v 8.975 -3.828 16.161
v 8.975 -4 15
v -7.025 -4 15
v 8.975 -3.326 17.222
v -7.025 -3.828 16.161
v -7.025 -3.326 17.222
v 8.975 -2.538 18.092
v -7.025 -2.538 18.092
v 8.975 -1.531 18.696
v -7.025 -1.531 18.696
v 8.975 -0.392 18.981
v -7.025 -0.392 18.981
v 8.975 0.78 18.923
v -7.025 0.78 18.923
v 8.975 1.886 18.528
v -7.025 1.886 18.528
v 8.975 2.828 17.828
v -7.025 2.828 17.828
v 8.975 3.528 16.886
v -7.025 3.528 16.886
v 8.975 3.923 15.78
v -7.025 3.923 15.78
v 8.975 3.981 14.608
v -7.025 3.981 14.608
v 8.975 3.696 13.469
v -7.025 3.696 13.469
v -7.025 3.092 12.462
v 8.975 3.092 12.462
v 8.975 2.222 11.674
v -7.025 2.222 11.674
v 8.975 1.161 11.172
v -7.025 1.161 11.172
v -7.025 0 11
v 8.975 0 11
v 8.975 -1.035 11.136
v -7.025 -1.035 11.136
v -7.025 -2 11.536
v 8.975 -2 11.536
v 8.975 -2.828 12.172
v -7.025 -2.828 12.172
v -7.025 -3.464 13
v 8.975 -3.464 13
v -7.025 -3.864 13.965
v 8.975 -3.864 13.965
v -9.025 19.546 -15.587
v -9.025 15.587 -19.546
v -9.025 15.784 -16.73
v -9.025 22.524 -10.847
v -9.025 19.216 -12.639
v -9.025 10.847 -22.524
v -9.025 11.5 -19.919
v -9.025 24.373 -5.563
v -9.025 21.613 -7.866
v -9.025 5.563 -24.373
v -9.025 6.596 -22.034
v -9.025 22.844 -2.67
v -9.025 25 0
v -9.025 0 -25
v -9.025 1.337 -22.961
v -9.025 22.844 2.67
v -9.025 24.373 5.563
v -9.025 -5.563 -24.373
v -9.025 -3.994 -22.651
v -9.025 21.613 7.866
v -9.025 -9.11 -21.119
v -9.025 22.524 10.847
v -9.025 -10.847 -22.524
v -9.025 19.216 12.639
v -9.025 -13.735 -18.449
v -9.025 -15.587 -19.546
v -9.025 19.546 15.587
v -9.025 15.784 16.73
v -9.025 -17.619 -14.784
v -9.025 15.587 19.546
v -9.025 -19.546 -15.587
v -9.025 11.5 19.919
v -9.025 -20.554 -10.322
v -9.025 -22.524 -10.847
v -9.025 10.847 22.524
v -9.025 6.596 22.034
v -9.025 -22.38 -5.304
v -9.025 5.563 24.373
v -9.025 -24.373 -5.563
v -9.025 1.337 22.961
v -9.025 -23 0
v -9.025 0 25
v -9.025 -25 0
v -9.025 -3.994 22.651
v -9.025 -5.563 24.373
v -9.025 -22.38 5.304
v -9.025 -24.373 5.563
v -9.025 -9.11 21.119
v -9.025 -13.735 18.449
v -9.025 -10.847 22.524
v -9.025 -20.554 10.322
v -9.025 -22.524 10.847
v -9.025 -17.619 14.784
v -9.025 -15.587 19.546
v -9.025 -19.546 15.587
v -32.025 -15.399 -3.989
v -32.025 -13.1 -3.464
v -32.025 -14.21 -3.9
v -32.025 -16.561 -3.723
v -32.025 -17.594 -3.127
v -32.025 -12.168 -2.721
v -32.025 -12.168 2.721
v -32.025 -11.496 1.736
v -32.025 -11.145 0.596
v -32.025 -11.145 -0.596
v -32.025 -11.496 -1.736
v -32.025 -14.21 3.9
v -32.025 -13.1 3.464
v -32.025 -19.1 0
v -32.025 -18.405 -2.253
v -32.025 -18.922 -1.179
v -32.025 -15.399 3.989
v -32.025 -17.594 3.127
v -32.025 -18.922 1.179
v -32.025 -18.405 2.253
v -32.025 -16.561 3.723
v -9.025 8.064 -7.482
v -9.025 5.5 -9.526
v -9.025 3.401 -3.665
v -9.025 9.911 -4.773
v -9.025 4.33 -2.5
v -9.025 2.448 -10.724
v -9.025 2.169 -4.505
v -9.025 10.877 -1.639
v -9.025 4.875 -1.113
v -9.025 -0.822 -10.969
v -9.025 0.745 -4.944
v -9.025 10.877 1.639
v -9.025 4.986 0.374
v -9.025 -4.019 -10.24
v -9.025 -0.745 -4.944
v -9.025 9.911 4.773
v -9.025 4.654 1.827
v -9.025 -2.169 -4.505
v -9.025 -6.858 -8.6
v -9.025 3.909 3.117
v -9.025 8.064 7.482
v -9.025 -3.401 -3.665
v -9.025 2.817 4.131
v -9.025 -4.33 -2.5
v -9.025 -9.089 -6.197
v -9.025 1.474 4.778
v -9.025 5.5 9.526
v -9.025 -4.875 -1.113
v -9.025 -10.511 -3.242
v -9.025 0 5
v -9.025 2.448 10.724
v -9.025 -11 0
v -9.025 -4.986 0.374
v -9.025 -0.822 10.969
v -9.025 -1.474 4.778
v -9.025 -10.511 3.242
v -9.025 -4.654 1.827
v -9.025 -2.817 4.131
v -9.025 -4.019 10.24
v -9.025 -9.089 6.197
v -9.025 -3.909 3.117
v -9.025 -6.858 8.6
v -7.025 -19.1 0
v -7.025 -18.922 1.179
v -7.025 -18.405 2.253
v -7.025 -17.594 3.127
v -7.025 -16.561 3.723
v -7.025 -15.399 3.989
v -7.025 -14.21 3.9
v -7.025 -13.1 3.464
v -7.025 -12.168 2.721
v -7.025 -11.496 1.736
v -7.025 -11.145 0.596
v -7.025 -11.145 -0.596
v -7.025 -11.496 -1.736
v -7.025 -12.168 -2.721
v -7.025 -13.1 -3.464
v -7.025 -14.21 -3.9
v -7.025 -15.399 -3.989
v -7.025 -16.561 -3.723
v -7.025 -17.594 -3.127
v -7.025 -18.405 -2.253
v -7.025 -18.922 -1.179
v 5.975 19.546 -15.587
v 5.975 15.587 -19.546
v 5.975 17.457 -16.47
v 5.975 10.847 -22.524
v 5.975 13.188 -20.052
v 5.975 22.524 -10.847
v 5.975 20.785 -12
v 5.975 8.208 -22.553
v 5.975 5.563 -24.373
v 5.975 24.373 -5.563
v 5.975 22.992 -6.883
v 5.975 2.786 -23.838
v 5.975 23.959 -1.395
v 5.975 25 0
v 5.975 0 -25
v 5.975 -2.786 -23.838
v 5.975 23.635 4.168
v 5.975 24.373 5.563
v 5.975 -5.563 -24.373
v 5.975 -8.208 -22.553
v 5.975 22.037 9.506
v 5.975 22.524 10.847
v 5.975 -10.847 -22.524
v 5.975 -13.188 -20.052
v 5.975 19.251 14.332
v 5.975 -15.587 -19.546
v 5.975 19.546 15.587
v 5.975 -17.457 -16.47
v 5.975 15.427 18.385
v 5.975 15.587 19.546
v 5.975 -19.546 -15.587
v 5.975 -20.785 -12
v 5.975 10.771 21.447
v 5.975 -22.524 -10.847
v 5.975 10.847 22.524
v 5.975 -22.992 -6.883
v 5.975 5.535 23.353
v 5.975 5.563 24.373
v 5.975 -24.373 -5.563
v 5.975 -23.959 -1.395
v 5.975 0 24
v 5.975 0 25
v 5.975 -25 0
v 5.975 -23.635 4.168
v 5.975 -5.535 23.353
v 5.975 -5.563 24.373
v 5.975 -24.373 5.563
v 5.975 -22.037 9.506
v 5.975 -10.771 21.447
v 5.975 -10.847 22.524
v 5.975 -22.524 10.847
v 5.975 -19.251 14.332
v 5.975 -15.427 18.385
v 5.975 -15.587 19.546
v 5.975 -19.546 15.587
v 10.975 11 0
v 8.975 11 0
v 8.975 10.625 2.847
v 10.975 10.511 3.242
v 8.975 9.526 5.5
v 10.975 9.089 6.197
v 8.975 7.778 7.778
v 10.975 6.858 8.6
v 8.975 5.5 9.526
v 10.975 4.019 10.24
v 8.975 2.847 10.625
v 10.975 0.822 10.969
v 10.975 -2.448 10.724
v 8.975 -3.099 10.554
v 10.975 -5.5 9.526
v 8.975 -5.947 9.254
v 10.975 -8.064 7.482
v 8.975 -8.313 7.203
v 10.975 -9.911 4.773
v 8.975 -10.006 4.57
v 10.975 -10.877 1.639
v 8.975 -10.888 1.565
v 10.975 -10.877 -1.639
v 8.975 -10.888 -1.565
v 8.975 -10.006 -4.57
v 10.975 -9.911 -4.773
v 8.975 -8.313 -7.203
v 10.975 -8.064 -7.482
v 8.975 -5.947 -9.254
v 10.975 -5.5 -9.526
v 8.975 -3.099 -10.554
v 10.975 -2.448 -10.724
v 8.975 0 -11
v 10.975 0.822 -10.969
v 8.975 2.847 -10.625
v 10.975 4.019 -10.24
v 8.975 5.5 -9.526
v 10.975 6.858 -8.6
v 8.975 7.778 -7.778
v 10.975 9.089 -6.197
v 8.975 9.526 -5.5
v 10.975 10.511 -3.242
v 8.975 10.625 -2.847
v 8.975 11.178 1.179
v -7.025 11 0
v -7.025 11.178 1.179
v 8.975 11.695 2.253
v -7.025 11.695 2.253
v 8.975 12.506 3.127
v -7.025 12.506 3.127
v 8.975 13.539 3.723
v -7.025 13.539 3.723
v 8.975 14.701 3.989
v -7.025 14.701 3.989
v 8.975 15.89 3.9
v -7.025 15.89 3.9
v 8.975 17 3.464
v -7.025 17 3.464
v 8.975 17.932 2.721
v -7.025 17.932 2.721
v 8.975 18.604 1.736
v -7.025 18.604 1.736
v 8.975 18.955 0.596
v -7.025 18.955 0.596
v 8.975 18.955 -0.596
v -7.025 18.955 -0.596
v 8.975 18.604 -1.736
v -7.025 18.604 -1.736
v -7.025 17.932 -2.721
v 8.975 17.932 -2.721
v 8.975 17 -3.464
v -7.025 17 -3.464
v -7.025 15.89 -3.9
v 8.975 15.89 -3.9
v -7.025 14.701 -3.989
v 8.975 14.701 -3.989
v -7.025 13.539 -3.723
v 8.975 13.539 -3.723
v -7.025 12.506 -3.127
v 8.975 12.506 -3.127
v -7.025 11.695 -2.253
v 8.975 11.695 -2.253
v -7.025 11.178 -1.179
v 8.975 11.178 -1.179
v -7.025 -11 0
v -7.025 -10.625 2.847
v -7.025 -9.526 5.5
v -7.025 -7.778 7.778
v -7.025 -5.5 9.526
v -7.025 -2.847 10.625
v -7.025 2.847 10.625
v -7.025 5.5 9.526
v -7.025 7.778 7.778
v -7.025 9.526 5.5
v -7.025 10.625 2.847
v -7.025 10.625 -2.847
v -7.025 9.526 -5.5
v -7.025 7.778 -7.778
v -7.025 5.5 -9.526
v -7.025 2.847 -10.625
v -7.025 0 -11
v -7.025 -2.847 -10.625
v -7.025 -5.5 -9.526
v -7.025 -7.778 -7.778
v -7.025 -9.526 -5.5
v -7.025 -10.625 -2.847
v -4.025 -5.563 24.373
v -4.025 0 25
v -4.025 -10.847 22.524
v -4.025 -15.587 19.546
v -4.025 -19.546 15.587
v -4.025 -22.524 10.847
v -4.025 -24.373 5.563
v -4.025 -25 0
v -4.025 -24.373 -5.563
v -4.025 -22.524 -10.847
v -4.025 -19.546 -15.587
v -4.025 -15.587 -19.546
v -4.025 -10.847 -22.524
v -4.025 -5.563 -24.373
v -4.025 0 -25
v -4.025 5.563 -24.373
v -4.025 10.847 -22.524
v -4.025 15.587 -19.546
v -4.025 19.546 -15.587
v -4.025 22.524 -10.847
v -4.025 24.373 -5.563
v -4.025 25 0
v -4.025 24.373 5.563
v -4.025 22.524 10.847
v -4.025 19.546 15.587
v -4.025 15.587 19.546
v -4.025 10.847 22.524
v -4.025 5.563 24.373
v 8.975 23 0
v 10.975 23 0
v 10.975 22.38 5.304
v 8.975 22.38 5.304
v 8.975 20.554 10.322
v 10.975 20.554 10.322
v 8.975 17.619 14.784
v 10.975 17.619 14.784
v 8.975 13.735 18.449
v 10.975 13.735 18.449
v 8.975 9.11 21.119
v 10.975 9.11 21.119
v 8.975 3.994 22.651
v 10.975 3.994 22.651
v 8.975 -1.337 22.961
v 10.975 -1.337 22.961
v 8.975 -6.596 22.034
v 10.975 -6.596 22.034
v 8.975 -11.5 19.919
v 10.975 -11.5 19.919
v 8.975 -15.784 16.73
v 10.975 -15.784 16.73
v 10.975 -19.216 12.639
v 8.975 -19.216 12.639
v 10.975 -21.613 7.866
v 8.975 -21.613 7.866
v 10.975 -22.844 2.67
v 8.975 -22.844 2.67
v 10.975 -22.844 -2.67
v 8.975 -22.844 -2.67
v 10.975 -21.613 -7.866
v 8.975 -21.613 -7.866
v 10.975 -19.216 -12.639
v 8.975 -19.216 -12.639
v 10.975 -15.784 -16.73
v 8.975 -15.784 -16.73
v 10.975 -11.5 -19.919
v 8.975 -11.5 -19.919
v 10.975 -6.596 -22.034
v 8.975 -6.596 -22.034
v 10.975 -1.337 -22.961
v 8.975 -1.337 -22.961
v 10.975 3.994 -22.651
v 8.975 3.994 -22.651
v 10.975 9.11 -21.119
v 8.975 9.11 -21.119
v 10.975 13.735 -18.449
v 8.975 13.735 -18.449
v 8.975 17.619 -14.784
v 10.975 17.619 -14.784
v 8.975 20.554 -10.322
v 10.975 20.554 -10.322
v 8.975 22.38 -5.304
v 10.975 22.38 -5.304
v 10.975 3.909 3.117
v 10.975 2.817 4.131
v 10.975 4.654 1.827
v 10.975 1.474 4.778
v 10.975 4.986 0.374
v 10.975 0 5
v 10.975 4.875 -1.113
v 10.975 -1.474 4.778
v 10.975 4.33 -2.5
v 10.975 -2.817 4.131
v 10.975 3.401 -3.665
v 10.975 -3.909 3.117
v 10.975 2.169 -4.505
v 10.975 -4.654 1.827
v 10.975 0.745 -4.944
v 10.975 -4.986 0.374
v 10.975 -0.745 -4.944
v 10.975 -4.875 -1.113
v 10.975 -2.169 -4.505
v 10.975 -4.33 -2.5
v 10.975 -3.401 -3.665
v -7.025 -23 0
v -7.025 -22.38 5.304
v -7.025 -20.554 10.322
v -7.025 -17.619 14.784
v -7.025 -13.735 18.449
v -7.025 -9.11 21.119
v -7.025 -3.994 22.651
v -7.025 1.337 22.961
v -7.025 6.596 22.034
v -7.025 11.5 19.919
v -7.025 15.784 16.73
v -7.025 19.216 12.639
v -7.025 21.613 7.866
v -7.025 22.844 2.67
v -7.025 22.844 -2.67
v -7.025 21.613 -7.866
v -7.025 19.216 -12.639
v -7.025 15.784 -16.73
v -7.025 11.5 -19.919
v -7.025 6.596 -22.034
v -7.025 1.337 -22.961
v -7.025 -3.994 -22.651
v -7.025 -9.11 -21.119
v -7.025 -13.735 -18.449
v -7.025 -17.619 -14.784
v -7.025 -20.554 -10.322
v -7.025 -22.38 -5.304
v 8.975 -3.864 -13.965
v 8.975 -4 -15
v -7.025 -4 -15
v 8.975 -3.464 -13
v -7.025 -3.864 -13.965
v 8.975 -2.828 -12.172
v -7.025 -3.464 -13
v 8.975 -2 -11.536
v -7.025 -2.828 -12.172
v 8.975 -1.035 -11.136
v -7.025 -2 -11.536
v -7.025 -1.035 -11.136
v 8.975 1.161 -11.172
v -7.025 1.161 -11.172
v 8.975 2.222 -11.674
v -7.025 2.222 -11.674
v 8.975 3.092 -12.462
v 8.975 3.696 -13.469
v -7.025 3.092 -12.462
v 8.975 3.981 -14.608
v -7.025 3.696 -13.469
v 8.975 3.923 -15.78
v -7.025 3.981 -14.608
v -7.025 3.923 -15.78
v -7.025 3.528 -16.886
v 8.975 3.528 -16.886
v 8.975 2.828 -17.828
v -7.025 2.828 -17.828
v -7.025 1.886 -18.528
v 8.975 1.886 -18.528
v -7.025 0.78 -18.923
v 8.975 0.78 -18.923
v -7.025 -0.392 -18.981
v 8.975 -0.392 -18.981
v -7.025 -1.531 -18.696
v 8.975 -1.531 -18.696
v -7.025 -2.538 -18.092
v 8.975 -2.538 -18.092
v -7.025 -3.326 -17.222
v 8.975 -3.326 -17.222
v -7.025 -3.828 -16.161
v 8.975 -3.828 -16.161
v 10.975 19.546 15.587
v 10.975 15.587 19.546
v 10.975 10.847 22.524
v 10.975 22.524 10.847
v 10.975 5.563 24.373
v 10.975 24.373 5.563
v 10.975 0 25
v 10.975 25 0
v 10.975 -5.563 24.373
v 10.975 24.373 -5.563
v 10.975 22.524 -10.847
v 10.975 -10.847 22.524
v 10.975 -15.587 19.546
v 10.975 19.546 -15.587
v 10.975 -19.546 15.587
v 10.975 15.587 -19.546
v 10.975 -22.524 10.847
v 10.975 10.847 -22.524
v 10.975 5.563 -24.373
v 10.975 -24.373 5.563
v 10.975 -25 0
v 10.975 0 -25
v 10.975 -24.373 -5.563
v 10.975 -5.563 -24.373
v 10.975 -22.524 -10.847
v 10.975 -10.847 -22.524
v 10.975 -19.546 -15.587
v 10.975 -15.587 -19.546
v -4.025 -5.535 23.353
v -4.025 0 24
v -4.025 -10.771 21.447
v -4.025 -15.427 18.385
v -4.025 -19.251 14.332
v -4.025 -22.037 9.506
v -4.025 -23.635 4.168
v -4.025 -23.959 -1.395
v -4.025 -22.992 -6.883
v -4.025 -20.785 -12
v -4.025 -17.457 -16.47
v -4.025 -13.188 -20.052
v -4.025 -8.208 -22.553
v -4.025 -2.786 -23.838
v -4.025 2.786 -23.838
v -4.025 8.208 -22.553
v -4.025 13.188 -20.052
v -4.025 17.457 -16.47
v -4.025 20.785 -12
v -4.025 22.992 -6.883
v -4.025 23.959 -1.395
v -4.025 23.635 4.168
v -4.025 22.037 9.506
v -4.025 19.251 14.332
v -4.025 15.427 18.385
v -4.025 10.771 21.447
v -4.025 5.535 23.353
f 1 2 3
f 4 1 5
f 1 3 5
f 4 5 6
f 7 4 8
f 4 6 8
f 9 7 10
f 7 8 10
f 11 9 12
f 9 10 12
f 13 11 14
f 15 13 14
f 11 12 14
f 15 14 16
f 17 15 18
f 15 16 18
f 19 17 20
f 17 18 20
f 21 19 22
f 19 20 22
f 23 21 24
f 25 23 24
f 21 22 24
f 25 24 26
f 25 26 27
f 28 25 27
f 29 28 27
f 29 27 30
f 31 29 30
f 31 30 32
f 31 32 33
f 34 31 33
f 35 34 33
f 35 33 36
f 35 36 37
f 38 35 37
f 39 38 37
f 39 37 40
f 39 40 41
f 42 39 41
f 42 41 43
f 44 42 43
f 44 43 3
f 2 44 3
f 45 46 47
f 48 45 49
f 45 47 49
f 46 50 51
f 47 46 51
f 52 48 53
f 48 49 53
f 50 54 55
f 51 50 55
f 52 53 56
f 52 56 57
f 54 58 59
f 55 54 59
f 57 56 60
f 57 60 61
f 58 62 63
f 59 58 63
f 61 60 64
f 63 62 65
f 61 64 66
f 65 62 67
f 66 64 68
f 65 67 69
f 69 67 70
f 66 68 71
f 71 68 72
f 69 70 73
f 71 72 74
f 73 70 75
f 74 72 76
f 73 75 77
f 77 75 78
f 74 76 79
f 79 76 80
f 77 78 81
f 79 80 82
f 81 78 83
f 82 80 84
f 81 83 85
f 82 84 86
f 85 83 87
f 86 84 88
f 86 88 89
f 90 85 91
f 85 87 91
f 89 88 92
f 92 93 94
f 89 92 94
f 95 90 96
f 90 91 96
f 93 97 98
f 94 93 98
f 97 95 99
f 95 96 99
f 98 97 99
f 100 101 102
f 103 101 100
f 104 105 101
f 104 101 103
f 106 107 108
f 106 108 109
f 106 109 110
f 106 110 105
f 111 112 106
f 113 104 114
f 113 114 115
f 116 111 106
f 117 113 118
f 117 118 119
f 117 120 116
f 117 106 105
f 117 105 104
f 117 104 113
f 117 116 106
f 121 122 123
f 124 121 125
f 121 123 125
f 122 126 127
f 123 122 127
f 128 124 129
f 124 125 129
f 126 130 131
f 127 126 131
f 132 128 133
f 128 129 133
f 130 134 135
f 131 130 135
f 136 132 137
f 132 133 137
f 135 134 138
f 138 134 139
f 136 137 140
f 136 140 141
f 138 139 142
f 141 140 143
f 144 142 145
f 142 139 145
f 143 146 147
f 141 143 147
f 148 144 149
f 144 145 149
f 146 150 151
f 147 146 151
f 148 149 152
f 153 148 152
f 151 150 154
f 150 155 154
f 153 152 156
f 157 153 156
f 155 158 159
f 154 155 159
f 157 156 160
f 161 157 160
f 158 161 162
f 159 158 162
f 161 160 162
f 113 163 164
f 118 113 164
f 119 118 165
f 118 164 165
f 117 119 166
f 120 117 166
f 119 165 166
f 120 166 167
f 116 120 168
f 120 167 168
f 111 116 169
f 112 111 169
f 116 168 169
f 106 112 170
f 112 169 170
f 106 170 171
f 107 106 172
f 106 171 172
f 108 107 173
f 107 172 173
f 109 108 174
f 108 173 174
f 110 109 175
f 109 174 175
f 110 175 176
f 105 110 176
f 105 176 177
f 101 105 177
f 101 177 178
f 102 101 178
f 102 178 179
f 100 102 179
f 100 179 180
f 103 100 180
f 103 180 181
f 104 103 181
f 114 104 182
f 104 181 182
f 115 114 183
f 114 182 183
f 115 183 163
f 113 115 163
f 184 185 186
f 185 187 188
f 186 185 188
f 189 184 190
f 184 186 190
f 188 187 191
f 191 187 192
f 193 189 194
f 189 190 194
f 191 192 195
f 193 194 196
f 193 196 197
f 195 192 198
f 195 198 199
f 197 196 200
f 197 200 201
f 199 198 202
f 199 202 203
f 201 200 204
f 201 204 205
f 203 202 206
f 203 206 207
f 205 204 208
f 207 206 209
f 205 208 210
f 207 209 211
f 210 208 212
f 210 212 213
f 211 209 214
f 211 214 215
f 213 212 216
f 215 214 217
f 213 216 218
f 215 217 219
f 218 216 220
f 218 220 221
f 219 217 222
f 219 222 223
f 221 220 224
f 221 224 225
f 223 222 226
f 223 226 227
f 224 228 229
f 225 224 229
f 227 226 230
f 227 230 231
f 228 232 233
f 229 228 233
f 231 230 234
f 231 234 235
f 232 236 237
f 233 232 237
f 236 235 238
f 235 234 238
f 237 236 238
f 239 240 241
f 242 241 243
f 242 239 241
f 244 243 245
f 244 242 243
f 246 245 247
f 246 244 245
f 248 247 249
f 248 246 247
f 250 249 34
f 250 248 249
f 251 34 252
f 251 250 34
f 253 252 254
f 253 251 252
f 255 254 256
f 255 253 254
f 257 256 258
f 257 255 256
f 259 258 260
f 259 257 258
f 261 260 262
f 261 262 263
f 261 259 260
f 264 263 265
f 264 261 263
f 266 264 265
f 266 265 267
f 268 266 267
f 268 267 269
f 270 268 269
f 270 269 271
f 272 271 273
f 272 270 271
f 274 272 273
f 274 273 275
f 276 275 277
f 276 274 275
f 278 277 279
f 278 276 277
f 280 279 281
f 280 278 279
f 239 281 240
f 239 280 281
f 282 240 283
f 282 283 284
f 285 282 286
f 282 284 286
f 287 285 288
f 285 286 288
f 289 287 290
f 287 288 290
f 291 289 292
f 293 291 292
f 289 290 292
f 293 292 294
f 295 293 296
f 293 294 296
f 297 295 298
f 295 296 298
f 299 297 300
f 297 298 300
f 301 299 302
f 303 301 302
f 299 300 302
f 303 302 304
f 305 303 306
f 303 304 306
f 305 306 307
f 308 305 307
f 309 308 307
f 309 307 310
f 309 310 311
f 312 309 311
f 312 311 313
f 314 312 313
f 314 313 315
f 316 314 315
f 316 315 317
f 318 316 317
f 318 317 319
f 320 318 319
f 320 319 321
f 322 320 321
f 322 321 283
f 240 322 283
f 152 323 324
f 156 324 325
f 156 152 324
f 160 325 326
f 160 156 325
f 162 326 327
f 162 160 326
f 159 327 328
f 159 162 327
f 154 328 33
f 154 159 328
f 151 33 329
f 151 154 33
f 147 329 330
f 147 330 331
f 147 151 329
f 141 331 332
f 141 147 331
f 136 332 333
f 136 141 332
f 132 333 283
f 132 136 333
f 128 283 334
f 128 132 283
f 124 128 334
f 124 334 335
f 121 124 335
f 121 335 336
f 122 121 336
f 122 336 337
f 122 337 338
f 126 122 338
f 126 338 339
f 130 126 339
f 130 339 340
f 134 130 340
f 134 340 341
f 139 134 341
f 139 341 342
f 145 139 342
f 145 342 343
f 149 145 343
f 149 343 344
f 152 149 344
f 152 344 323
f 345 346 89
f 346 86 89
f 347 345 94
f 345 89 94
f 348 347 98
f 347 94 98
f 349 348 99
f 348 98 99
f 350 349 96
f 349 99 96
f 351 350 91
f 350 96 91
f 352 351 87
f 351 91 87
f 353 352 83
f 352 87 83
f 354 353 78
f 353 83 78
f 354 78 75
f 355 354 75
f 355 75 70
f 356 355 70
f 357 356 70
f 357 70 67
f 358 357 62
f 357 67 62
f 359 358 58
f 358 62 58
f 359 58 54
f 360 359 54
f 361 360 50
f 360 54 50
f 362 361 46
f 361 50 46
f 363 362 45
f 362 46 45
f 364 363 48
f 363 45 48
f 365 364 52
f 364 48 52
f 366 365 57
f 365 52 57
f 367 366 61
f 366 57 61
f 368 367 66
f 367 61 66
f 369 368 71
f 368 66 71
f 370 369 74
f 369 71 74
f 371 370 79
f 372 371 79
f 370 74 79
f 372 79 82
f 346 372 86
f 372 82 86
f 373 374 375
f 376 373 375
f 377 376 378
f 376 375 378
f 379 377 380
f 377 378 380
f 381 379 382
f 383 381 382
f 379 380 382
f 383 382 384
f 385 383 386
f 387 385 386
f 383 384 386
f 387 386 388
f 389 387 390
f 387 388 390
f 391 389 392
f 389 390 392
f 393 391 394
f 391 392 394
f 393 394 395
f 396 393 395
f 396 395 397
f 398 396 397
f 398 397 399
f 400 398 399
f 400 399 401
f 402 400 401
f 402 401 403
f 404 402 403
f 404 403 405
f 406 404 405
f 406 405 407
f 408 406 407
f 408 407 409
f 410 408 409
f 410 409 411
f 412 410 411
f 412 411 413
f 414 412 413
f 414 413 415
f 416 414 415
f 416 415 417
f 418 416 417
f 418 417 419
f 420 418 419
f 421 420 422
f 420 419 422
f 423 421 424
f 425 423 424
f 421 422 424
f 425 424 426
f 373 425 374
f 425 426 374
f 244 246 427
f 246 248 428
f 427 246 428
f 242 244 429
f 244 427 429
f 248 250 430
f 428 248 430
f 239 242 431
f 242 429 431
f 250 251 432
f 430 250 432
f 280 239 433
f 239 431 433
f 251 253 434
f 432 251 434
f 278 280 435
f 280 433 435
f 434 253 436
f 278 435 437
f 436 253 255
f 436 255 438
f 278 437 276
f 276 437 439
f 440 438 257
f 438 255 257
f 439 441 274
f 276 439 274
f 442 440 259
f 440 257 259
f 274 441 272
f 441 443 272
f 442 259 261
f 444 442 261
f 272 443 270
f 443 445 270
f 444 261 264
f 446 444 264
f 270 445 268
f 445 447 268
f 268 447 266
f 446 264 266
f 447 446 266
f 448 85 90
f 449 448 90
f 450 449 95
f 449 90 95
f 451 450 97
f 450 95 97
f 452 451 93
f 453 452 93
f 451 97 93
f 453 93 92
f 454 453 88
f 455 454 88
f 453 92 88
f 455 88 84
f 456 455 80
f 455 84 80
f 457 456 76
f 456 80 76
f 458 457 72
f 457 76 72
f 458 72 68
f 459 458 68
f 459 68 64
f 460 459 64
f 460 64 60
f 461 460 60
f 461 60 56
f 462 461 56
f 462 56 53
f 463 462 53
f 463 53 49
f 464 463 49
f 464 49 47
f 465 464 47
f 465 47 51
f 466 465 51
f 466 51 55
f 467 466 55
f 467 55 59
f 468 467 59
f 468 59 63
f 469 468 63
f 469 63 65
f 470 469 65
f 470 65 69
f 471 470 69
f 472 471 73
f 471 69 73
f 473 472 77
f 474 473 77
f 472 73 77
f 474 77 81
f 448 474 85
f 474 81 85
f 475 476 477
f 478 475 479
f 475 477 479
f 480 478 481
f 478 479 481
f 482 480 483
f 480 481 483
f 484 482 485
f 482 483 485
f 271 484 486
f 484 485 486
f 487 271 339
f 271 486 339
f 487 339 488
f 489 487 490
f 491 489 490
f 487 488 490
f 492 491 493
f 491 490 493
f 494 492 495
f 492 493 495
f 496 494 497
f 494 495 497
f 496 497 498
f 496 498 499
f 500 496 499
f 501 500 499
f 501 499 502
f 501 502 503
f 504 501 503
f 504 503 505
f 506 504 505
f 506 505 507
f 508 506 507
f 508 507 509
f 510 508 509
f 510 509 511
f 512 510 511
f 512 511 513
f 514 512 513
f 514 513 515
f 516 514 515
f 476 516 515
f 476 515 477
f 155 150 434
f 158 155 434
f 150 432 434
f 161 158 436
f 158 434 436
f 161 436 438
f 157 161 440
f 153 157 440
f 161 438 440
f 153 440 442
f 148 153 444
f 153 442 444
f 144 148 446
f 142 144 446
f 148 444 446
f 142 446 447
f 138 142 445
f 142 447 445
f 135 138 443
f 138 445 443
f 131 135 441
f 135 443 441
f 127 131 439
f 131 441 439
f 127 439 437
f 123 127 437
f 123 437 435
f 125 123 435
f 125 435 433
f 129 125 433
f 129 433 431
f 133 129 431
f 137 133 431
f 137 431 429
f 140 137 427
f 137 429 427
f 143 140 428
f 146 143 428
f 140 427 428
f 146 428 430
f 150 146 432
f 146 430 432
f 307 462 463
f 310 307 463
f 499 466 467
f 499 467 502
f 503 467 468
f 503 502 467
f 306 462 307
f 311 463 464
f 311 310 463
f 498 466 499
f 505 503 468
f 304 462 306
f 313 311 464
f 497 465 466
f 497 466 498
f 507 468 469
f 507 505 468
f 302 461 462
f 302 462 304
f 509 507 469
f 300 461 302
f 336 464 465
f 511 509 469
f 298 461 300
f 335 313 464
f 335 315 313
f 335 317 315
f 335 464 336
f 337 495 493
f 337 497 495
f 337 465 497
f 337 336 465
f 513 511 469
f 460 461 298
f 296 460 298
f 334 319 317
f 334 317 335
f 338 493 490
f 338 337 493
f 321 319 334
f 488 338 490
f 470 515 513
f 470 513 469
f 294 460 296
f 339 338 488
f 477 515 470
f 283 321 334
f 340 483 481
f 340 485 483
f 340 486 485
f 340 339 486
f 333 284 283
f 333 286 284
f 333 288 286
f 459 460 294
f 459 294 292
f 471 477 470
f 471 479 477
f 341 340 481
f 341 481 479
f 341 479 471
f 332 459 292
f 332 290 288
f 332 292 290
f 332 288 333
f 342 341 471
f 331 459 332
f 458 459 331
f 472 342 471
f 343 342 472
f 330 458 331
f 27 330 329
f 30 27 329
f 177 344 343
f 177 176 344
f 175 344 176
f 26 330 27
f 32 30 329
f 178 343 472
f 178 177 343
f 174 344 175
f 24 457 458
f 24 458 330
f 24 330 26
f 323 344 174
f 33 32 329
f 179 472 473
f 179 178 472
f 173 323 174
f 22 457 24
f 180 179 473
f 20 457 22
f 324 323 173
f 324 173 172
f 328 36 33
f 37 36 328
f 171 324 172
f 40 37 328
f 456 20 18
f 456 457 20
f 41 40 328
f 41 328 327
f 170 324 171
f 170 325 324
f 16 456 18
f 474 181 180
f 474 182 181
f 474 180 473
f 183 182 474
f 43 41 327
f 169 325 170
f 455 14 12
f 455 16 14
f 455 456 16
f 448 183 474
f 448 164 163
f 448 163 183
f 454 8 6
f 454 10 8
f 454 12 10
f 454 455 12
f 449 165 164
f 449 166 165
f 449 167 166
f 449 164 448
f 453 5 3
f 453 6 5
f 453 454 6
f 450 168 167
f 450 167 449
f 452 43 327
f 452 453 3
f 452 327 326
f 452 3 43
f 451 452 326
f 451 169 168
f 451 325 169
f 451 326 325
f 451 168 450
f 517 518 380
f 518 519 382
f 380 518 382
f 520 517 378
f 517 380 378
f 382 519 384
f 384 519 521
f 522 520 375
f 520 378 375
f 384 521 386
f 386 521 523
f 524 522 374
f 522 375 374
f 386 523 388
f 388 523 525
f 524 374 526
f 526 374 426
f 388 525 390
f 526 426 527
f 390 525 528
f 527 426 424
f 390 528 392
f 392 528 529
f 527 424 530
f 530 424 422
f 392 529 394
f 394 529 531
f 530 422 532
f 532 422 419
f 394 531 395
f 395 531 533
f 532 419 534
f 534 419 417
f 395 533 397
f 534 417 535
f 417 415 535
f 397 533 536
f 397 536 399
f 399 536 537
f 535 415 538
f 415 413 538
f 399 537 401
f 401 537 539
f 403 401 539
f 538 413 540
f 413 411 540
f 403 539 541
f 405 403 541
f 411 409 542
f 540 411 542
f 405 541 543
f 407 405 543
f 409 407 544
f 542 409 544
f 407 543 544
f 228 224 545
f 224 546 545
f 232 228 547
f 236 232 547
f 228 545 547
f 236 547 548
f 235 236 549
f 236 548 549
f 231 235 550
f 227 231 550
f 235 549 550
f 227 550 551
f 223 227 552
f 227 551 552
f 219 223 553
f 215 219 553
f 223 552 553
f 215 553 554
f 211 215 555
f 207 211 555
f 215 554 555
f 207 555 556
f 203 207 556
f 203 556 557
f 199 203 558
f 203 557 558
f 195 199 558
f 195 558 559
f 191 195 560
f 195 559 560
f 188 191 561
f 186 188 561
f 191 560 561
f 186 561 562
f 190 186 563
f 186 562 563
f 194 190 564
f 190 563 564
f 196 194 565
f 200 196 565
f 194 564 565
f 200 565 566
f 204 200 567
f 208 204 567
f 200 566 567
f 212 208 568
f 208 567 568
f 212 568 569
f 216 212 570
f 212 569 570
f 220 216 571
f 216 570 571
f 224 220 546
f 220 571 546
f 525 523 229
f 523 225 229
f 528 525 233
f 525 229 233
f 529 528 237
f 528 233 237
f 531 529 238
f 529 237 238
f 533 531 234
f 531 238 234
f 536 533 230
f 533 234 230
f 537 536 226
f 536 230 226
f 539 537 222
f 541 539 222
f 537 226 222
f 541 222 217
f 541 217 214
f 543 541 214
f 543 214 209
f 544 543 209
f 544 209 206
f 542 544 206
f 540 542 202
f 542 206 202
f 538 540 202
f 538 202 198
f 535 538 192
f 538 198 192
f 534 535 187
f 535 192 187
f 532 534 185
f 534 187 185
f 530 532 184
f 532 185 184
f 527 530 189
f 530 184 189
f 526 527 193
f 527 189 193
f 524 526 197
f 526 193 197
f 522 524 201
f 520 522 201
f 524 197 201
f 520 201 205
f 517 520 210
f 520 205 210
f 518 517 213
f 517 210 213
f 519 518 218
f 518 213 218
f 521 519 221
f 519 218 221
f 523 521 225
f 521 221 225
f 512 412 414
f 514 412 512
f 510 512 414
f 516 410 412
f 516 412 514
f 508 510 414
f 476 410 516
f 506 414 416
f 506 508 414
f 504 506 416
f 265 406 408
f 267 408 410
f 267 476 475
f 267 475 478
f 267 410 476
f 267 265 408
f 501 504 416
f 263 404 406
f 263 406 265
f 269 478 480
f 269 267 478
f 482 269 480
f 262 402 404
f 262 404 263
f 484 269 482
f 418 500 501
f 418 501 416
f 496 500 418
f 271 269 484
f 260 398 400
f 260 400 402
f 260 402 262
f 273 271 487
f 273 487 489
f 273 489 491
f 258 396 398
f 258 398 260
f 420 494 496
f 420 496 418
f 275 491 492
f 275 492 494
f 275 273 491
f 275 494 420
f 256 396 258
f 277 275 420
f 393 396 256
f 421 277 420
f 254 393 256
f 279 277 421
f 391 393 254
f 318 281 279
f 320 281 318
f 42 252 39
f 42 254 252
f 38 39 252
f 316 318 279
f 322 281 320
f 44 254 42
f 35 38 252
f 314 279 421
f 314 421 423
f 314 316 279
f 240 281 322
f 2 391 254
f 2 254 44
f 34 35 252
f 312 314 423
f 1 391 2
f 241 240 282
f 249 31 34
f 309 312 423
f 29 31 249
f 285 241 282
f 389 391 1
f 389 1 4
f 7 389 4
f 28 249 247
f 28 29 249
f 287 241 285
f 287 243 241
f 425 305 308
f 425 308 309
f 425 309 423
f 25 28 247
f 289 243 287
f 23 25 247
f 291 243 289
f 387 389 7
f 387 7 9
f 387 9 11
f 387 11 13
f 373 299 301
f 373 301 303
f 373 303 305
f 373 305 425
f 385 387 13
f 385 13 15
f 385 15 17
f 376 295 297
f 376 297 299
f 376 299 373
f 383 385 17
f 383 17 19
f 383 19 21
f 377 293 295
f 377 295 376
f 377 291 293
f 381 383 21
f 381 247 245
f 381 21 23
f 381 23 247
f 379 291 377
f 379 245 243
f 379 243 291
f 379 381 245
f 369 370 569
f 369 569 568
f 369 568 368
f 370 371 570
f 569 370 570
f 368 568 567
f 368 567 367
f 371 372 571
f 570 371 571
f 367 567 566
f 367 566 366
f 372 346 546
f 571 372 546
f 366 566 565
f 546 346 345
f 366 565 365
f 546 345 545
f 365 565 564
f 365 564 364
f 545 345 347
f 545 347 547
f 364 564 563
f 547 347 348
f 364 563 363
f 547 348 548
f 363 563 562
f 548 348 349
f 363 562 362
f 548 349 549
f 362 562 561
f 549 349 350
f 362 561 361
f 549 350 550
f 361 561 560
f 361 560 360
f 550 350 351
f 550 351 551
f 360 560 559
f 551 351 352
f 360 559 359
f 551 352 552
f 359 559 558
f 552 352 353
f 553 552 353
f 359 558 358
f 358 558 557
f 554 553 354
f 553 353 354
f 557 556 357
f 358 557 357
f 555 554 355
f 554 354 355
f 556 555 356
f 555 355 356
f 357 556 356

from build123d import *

# Parameters (mm, degrees)
F2_R      = 4
F3_DEPTH  = 20.001
F5_R      = 23
F5_R_2    = 11
F6_DEPTH  = 3
F8_R      = 23
F8_R_2    = 11
F9_DEPTH  = 3
F10_R     = 4
F11_DEPTH = 25


with BuildPart() as f1:
    # F0 (on Front) → F1 (revolve)
    with BuildSketch(Plane.XZ):
        Polygon((10.9751848876, 5), (10.9751848876, 25), (5.9751848876, 25), (5.9751848876, 24), (-4.0248151124, 24), (-4.0248151124, 25), (-9.0248151124, 25), (-9.0248151124, 5), align=None)
    revolve(axis=Axis((1.0365527123, 0, 0), (1, 0, 0)))

    # F2 (on face) → F3 (cut, through all)
    with BuildSketch(Plane(origin=(-9.0248151124, 0, 0), x_dir=(0, -1, 0), z_dir=(-1, 0, 0))):
        with Locations((0, 15)):
            Circle(F2_R)
        with Locations((-15, 0)):
            Circle(F2_R)
        with Locations((0, -15)):
            Circle(F2_R)
    extrude(amount=-F3_DEPTH, mode=Mode.SUBTRACT)

    # F5 (on offset) → F6 (cut)
    with BuildSketch(Plane(origin=(-10.0248151124, 0, 0), x_dir=(0, -1, 0), z_dir=(-1, 0, 0))):
        Circle(F5_R)
        Circle(F5_R_2, mode=Mode.SUBTRACT)
    extrude(amount=-F6_DEPTH, mode=Mode.SUBTRACT)

    # F8 (on offset) → F9 (cut)
    with BuildSketch(Plane.YZ.offset(11.9751848876)):
        Circle(F8_R)
        Circle(F8_R_2, mode=Mode.SUBTRACT)
    extrude(amount=-F9_DEPTH, mode=Mode.SUBTRACT)

    # F10 (on face) → F11 (join)
    with BuildSketch(Plane(origin=(-7.0248151124, 0, 0), x_dir=(0, -1, 0), z_dir=(-1, 0, 0))):
        with Locations((15.1, 0)):
            Circle(F10_R)
    extrude(amount=F11_DEPTH)


solid = f1.part
